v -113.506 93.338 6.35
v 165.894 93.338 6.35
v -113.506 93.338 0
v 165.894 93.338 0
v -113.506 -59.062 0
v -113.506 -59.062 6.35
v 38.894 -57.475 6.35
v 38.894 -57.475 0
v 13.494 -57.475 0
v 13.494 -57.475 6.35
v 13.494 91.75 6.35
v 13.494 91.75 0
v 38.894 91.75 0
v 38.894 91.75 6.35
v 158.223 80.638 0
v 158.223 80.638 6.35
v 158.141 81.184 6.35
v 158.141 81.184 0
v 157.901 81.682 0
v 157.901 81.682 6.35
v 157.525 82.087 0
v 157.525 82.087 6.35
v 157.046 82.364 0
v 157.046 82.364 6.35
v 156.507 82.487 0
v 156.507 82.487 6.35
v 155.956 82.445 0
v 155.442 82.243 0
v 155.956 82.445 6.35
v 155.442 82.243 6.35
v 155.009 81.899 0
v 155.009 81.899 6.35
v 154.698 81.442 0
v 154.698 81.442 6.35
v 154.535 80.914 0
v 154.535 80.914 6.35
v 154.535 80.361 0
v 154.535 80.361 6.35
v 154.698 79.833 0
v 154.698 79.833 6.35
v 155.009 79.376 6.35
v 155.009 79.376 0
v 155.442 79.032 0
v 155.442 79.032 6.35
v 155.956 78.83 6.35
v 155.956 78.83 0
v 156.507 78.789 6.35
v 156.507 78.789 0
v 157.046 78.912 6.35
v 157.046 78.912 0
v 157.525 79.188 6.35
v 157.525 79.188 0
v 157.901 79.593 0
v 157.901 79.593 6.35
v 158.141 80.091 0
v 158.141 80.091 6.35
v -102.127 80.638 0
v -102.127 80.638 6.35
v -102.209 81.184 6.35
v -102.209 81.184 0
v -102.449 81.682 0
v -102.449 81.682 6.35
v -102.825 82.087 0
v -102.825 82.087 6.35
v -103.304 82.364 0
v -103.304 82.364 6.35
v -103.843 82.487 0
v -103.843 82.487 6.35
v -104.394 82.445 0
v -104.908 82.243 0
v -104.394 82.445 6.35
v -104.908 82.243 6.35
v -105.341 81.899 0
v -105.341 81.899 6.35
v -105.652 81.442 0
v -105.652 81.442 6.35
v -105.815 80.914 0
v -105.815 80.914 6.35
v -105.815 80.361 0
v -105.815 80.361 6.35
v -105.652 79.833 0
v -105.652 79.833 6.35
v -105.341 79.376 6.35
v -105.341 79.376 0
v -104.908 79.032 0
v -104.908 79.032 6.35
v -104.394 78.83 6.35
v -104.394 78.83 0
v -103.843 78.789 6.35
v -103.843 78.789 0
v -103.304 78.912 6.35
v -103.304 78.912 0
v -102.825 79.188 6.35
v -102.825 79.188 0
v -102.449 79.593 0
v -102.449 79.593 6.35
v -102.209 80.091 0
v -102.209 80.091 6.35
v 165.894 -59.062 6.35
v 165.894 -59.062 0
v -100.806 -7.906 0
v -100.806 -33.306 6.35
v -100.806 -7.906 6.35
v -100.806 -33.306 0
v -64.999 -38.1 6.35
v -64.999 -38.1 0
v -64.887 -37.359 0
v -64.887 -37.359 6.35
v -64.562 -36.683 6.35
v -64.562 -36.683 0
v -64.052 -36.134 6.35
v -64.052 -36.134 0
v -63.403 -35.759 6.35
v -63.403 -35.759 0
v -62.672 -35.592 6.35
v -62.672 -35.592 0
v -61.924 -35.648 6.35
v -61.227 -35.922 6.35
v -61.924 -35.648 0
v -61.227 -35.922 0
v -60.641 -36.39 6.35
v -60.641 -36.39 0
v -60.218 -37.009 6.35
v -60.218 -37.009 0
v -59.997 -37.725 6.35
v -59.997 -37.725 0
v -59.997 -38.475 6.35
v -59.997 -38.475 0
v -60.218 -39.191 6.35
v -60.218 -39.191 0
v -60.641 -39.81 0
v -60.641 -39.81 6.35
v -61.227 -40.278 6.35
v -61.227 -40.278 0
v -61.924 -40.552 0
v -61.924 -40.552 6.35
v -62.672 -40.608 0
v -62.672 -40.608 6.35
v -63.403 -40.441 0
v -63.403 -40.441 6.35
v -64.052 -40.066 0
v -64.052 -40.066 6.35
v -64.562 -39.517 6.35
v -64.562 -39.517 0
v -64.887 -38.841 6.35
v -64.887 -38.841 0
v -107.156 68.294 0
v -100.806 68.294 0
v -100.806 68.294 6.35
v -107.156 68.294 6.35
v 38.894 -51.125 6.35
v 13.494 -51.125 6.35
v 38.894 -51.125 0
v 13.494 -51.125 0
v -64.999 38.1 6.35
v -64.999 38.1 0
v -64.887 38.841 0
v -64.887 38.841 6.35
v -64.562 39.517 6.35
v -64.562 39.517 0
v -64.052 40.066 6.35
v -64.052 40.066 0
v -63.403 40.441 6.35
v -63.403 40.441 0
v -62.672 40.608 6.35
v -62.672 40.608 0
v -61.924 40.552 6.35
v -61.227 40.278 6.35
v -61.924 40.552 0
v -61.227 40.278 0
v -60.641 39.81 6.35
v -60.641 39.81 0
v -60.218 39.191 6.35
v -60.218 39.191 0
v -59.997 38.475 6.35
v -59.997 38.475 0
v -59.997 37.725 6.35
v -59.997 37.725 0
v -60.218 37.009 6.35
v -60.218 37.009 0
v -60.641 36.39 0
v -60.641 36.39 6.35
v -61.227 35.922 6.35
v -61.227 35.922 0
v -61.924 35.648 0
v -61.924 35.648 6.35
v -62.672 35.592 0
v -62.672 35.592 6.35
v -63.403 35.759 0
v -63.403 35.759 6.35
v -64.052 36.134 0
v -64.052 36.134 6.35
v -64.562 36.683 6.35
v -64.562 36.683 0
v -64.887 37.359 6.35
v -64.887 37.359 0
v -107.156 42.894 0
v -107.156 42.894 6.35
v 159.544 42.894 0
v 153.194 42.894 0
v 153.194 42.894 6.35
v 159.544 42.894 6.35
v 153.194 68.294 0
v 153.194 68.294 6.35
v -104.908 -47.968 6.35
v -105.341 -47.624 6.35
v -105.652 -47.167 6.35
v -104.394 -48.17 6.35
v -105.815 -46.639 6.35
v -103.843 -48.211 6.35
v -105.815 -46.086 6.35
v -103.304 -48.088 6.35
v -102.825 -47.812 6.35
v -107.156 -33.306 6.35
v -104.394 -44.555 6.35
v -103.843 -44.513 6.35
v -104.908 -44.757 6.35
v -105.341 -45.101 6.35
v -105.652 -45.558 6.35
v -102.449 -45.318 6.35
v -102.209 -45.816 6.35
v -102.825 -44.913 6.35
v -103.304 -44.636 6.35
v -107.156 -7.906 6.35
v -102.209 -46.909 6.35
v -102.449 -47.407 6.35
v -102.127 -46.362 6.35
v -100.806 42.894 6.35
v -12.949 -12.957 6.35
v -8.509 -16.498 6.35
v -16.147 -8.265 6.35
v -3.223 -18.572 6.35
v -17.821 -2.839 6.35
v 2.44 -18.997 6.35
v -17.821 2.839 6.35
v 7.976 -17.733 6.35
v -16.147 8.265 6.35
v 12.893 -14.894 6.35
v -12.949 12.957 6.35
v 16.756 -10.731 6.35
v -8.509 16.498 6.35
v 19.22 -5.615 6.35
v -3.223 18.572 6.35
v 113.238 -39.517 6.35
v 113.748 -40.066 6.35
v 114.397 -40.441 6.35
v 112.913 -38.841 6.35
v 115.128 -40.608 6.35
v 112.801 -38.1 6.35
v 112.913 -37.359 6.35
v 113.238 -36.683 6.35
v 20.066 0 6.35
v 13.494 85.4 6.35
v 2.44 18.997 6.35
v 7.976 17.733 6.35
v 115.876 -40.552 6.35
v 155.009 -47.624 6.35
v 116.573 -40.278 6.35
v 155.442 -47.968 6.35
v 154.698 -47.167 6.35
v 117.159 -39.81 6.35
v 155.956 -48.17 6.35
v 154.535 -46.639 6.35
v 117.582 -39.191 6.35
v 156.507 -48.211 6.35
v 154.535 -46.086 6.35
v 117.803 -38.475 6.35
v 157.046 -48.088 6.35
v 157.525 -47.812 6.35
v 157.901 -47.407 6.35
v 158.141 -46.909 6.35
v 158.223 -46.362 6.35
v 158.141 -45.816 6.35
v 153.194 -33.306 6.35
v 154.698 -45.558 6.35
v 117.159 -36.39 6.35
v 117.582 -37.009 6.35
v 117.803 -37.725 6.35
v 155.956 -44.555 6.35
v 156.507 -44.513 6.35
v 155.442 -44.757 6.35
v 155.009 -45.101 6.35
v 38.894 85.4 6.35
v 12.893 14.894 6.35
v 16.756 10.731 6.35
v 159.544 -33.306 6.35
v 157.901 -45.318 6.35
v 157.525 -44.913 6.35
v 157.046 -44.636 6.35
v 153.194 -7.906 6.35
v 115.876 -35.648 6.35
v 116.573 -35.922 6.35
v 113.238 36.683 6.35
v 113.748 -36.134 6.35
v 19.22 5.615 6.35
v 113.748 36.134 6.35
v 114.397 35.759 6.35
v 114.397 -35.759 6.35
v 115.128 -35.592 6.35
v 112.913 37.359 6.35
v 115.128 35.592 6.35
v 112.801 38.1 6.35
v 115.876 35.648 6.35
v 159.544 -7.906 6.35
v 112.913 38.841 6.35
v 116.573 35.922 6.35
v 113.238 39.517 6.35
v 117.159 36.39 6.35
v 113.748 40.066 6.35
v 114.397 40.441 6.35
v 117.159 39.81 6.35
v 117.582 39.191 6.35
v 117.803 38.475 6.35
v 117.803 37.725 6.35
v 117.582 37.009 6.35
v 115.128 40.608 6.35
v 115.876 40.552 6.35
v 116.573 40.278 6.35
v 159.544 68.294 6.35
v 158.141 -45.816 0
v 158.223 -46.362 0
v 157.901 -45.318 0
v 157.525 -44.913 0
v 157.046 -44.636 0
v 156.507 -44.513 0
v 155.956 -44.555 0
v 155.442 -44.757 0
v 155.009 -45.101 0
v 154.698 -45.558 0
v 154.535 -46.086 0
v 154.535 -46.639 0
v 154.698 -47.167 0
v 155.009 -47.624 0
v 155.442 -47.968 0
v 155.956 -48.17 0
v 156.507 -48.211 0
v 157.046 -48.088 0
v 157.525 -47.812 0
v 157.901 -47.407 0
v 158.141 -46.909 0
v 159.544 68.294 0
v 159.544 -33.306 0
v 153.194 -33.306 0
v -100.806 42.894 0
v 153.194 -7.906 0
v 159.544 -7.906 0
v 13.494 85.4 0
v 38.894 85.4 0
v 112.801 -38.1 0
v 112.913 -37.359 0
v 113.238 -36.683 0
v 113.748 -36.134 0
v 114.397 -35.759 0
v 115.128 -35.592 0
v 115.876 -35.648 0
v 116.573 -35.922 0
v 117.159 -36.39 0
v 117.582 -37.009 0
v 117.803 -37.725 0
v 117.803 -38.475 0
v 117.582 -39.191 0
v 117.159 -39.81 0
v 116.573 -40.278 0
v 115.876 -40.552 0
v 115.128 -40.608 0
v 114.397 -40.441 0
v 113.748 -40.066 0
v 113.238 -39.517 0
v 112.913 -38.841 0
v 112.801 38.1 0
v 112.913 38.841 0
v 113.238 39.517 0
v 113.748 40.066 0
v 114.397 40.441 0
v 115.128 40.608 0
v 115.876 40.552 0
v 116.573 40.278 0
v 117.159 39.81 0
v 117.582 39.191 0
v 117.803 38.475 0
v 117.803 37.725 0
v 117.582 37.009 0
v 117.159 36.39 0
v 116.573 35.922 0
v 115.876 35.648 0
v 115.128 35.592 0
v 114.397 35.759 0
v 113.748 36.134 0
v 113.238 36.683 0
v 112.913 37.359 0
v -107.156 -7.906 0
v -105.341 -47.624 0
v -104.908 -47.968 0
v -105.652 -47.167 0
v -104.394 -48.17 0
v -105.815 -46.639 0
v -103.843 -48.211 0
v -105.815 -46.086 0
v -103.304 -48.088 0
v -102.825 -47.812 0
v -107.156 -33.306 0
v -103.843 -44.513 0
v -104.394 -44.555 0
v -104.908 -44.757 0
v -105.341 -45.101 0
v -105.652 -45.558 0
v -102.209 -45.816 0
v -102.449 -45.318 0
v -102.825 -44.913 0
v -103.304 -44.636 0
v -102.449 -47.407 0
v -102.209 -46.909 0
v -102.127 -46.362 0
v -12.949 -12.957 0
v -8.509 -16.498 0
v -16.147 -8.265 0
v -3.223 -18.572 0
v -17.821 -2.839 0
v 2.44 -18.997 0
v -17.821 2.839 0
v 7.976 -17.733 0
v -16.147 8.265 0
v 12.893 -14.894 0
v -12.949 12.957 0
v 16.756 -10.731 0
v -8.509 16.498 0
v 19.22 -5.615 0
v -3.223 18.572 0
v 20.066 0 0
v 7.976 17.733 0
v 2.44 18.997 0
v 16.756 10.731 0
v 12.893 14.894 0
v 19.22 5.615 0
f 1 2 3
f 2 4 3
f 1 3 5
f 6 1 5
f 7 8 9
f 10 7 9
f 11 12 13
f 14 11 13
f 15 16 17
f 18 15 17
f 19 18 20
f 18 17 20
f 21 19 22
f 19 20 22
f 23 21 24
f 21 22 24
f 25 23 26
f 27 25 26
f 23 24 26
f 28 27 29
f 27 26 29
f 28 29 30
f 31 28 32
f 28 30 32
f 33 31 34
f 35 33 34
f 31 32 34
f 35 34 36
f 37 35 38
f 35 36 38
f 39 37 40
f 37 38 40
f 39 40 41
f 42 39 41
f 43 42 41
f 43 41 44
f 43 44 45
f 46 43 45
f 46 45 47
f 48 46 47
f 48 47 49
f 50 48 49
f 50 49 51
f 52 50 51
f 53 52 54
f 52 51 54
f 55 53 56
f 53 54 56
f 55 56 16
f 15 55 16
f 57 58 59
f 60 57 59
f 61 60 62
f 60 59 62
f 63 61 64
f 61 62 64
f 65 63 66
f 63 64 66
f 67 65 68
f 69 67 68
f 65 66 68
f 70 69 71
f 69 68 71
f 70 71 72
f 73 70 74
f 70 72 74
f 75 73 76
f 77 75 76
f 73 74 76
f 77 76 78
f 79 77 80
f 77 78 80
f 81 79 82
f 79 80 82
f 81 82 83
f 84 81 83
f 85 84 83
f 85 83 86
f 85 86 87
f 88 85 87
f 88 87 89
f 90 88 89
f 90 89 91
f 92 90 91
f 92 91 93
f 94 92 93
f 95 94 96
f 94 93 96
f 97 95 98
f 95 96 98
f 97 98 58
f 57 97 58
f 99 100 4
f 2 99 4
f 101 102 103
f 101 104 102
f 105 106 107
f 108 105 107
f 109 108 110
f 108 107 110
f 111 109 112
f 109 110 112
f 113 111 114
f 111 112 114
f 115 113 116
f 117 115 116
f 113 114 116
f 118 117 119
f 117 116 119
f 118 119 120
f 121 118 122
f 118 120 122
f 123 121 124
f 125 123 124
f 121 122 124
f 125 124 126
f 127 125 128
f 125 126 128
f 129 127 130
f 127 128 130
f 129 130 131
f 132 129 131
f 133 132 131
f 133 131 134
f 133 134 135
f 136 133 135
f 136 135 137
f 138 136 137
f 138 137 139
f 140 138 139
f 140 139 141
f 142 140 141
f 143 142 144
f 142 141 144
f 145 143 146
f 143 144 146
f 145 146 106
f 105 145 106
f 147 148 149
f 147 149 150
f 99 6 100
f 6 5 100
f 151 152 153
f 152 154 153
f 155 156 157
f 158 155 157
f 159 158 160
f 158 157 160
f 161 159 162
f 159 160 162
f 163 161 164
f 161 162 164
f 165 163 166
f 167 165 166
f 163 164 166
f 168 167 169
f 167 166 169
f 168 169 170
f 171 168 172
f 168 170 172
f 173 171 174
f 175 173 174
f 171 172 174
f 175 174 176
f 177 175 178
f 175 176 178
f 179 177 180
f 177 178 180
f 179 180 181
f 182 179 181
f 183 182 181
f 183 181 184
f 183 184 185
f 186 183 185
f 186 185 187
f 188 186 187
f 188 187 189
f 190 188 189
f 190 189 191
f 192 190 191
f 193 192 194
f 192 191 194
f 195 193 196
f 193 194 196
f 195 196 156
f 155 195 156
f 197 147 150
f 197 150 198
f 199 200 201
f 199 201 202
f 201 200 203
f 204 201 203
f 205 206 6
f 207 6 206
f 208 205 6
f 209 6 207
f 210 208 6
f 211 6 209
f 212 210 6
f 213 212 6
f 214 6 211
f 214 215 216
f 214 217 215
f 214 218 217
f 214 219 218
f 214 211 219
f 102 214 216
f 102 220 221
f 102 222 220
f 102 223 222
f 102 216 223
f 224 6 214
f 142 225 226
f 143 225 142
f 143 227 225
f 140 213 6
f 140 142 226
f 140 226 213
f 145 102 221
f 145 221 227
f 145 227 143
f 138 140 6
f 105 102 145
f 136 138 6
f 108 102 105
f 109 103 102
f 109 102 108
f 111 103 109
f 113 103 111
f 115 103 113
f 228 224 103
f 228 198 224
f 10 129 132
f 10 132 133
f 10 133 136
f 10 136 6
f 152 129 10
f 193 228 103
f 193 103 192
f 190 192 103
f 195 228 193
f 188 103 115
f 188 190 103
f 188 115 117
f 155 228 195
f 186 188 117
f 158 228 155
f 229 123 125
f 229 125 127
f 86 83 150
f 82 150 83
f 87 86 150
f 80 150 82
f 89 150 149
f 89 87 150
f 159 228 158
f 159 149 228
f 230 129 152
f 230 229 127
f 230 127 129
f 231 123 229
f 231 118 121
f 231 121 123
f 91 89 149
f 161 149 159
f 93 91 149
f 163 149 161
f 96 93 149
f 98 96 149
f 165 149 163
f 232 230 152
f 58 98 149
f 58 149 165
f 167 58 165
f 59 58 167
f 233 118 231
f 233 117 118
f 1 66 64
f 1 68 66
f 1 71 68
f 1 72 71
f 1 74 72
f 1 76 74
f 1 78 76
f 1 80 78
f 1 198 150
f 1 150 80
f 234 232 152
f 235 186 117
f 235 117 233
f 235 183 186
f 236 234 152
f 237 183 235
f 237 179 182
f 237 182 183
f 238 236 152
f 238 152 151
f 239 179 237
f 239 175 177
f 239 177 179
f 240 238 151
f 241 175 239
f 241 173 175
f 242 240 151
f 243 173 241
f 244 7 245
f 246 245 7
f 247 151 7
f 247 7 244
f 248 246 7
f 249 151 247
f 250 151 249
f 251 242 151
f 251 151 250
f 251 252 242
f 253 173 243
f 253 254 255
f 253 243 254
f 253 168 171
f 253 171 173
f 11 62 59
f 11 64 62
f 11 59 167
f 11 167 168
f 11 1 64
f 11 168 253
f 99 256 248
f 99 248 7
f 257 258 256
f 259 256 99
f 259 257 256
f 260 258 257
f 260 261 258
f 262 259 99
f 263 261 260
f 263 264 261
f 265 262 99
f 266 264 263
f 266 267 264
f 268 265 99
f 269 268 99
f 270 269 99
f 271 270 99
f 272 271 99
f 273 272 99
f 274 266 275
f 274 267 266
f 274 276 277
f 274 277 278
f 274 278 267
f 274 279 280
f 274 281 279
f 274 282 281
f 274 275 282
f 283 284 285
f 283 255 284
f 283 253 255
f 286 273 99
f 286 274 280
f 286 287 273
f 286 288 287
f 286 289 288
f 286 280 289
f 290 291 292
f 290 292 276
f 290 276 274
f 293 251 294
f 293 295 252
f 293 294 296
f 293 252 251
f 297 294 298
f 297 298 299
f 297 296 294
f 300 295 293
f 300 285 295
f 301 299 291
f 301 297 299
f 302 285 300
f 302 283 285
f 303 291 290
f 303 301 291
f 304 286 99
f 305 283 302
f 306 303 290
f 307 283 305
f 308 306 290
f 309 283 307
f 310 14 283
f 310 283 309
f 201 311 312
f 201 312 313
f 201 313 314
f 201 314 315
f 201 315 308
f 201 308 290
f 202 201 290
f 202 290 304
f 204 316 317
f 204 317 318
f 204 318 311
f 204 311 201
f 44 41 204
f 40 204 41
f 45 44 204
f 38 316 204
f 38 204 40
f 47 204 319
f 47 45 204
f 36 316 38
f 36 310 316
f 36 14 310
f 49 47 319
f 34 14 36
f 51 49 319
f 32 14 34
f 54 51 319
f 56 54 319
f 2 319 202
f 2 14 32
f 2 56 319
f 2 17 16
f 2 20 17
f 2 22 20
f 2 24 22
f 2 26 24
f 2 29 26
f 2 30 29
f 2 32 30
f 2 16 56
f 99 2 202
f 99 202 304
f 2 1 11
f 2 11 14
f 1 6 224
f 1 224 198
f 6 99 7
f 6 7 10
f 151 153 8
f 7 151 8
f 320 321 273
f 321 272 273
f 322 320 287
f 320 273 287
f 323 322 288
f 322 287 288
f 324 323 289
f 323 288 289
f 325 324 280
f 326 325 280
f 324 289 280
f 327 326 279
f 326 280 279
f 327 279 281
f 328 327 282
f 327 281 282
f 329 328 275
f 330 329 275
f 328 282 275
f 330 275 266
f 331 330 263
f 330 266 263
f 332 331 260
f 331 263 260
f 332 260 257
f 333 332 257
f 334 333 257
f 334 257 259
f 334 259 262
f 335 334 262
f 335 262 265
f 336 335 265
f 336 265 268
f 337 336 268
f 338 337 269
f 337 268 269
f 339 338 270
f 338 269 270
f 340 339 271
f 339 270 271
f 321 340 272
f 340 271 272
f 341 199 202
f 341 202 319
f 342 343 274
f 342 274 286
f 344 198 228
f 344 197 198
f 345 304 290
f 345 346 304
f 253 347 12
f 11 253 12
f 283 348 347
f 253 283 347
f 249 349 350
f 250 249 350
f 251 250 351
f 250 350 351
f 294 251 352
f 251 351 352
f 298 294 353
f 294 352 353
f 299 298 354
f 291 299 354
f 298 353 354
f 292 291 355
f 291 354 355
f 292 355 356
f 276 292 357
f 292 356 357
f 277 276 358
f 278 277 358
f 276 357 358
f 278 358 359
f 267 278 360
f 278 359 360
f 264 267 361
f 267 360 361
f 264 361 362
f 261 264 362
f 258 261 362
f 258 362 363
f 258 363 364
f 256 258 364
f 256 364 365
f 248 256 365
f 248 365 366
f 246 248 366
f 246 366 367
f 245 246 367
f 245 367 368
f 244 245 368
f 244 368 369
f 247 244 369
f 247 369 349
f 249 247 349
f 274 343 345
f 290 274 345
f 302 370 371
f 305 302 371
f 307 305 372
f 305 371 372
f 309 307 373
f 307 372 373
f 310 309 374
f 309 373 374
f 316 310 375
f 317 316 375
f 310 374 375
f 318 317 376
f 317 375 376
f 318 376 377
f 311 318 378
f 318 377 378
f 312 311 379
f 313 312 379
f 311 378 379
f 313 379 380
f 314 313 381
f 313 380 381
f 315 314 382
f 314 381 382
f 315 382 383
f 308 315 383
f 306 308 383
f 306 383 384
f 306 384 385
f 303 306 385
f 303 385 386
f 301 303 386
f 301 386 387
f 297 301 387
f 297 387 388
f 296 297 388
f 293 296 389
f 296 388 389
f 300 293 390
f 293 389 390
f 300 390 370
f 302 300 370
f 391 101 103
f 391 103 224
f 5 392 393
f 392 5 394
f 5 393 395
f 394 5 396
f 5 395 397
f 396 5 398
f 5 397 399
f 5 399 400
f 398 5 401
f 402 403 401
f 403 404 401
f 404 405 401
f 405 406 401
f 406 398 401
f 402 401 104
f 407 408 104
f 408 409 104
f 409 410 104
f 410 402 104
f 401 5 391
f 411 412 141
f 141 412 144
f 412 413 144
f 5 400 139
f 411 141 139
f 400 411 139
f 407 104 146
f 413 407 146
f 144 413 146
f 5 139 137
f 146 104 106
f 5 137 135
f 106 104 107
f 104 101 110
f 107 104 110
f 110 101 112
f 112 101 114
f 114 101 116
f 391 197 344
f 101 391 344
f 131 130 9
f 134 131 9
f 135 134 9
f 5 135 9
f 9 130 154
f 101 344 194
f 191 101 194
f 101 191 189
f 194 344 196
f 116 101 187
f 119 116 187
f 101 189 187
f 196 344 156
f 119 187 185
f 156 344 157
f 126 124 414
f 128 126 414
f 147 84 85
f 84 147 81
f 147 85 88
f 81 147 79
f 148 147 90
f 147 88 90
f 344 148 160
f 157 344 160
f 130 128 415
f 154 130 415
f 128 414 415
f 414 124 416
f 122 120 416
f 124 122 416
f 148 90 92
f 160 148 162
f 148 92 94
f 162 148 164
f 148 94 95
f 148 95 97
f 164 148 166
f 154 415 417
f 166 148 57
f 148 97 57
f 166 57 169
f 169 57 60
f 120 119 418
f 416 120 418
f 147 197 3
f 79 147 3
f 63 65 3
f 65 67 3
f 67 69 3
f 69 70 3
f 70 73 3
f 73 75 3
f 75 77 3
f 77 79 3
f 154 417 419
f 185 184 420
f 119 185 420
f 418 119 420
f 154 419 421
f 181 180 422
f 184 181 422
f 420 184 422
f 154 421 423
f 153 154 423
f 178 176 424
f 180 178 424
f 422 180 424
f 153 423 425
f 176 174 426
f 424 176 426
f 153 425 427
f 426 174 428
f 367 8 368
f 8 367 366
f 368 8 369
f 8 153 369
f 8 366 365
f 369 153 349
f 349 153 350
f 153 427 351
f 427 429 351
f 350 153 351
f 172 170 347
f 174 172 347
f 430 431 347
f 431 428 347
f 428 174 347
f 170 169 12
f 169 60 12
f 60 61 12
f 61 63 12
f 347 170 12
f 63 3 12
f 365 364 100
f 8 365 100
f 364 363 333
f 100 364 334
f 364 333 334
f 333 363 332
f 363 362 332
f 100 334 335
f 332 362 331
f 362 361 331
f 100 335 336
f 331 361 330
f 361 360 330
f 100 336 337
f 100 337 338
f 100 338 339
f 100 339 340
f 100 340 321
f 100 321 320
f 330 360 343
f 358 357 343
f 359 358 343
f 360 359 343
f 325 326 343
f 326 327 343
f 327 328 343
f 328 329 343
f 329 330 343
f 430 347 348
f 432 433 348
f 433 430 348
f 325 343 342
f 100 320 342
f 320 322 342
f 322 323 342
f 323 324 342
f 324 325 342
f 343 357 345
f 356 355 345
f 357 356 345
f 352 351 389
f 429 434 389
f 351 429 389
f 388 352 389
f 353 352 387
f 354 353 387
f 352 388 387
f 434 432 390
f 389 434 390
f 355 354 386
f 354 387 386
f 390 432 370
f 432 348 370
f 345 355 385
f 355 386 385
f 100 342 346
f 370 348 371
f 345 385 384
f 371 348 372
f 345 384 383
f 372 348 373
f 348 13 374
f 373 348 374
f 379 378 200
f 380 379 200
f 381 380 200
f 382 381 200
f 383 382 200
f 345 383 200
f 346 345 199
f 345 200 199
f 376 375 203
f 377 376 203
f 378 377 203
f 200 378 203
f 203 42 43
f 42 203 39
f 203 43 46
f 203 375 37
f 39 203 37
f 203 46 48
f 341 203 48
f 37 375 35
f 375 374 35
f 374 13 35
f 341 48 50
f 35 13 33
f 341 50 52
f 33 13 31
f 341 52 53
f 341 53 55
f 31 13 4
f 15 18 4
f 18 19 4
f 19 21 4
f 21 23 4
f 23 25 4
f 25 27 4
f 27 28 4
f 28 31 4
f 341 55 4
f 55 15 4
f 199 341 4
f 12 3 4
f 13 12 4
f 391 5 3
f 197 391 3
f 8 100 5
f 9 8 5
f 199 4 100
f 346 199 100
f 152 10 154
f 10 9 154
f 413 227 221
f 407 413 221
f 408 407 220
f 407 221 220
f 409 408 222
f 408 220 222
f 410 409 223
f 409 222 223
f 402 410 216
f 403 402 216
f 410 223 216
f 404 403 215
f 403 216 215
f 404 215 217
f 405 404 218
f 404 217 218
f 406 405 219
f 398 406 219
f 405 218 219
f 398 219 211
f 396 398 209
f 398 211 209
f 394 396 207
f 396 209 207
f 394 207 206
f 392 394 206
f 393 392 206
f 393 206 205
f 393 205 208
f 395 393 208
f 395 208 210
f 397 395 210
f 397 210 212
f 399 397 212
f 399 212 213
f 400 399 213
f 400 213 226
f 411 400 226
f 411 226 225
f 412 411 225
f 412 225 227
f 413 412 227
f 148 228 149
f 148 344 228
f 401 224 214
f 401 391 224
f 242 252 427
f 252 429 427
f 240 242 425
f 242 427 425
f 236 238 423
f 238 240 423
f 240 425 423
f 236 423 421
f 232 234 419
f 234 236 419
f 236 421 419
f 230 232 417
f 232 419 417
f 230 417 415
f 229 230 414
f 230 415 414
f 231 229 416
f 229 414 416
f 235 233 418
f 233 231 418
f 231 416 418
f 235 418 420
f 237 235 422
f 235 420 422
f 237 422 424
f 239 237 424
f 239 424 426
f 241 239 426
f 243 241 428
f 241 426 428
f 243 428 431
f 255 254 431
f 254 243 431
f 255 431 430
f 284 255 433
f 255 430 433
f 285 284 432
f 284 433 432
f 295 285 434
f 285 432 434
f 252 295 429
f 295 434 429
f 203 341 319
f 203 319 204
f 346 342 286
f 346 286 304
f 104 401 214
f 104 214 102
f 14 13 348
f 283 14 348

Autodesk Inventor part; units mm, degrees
ref_plane "YZ Plane" through (0, 0, 0) normal (1, 0, 0) x (0, 1, 0)
ref_plane "XZ Plane" through (0, 0, 0) normal (0, 1, 0) x (-1, 0, 0)
ref_plane "XY Plane" through (0, 0, 0) normal (0, 0, 1) x (1, 0, 0)
sketch "Sketch1" plane through (0, 0, 0) normal (0, 0, 1) x (1, 0, 0)
  circle A0 centre (1.016, 0) radius 19.05
  line L0 (159.5437, -28.575) -> (159.5437, 29.0493) projected
  line L1 (145.8277, 86.9876) -> (-55.3403, 86.9876) projected
  line L2 (159.5437, 93.3376) -> (-107.1563, 93.3376)
  line L3 (-107.1563, 93.3376) -> (-107.1563, -59.0624)
  line L4 (-107.1563, -59.0624) -> (159.5437, -59.0624)
  line L5 (159.5437, -59.0624) -> (159.5437, 93.3376)
  point P0 (0, 0)
  dimension "d0" = 266.7
  dimension "d1" = 152.4
  dimension "d15" = 38.1
extrude "Extrusion1" add sketch "Sketch1" along normal blind 6.35
sketch "Sketch2" plane through (0, 0, 6.35) normal (0, 0, 1) x (1, 0, 0)
  line L0 (-107.1563, 93.3376) -> (159.5437, 93.3376) projected
  line L1 (-107.1563, -59.0624) -> (-107.1563, 93.3376) projected
  line L2 (-103.9813, 93.3376) -> (-103.9813, -59.0624) construction
  circle A0 centre (-103.9813, 80.6376) radius 1.8542
  dimension "d4" = 3.175
  dimension "d5" = 3.7084
  dimension "d6" = 12.7
extrude "Extrusion2" cut sketch "Sketch2" against normal through all
pattern_linear "Rectangular Pattern1" count 2 spacing 127 along (0, -1, 0) count 2 spacing 260.35 along (1, 0, 0) of "Extrusion2"
sketch "Sketch3" plane through (0, 0, 0) normal (0, 0, -1) x (-1, 0, 0)
  circle A0 centre (62.484, 38.1) radius 2.5146 projected
  circle A1 centre (62.484, -38.1) radius 2.5146 projected
  circle A2 centre (-115.316, -38.1) radius 2.5146 projected
  circle A3 centre (-115.316, 38.1) radius 2.5146 projected
  point P0 (0, 0)
extrude "Extrusion3" cut sketch "Sketch3" against normal through all
sketch "Sketch4" plane through (0, 0, 0) normal (0, 0, -1) x (-1, 0, 0)
  line L0 (107.1563, 93.3376) -> (113.5063, 93.3376)
  line L1 (113.5063, 93.3376) -> (113.5063, -59.0624)
  line L2 (113.5063, -59.0624) -> (107.1563, -59.0624)
  line L3 (107.1563, -59.0624) -> (107.1563, 93.3376)
  line L4 (-159.5437, -59.0624) -> (-165.8937, -59.0624)
  line L5 (-165.8937, -59.0624) -> (-165.8937, 93.3376)
  line L6 (-165.8937, 93.3376) -> (-159.5437, 93.3376)
  line L7 (-159.5437, 93.3376) -> (-159.5437, -59.0624)
  point P0 (0, 0)
  dimension "d18" = 6.35
  dimension "d19" = 6.35
extrude "Extrusion4" add sketch "Sketch4" against normal blind 6.35
sketch "Sketch5" plane through (0, 0, 0) normal (0, 0, -1) x (-1, 0, 0)
  line L0 (-159.5437, -59.0624) -> (-159.5437, 93.3376) projected
  line L1 (-159.5437, 93.3376) -> (-153.1937, 93.3376) projected
  line L2 (-153.1937, -59.0624) -> (-153.1937, 93.3376) projected
  line L3 (-159.5437, -59.0624) -> (-153.1937, -59.0624) projected
  line L4 (-159.5437, 68.2942) -> (-153.1937, 68.2942)
  line L5 (-153.1937, 68.2942) -> (-153.1937, 42.8942)
  line L6 (-153.1937, 42.8942) -> (-159.5437, 42.8942)
  line L7 (-159.5437, 42.8942) -> (-159.5437, 68.2942)
  line L8 (-159.5437, -7.9058) -> (-153.1937, -7.9058)
  line L9 (-153.1937, -7.9058) -> (-153.1937, -33.3058)
  line L10 (-153.1937, -33.3058) -> (-159.5437, -33.3058)
  line L11 (-159.5437, -33.3058) -> (-159.5437, -7.9058)
  line L12 (100.8063, 68.2942) -> (107.1563, 68.2942)
  line L13 (107.1563, 68.2942) -> (107.1563, 42.8942)
  line L14 (107.1563, 42.8942) -> (100.8063, 42.8942)
  line L15 (100.8063, 42.8942) -> (100.8063, 68.2942)
  line L16 (100.8063, -7.9058) -> (107.1563, -7.9058)
  line L17 (107.1563, -7.9058) -> (107.1563, -33.3058)
  line L18 (107.1563, -33.3058) -> (100.8063, -33.3058)
  line L19 (100.8063, -33.3058) -> (100.8063, -7.9058)
  point P0 (0, 0)
  dimension "d22" = 25.4
  dimension "d25" = 76.2
  dimension "d28" = 260.35
extrude "Extrusion5" cut sketch "Sketch5" against normal through all contours L0 L8 L2 L10 | L0 L4 L2 L6 | L12 L13 L14 L15 | L16 L17 L18 L19
sketch "Sketch6" plane through (0, 0, 0) normal (0, 0, -1) x (-1, 0, 0)
  line L0 (-13.4937, 85.4001) -> (-13.4937, 91.7501) projected
  line L1 (-13.4937, 91.7501) -> (-38.8937, 91.7501) projected
  line L2 (-38.8937, 91.7501) -> (-38.8937, 85.4001) projected
  line L3 (-38.8937, 85.4001) -> (-13.4937, 85.4001) projected
  line L4 (-13.4937, -57.4749) -> (-13.4937, -51.1249) projected
  line L5 (-13.4937, -51.1249) -> (-38.8937, -51.1249) projected
  line L6 (-38.8937, -51.1249) -> (-38.8937, -57.4749) projected
  line L7 (-38.8937, -57.4749) -> (-13.4937, -57.4749) projected
  point P0 (0, 0)
extrude "Extrusion6" cut sketch "Sketch6" against normal through all
properties part number "panStepperMountRB02" material "Wood (Oak)"
